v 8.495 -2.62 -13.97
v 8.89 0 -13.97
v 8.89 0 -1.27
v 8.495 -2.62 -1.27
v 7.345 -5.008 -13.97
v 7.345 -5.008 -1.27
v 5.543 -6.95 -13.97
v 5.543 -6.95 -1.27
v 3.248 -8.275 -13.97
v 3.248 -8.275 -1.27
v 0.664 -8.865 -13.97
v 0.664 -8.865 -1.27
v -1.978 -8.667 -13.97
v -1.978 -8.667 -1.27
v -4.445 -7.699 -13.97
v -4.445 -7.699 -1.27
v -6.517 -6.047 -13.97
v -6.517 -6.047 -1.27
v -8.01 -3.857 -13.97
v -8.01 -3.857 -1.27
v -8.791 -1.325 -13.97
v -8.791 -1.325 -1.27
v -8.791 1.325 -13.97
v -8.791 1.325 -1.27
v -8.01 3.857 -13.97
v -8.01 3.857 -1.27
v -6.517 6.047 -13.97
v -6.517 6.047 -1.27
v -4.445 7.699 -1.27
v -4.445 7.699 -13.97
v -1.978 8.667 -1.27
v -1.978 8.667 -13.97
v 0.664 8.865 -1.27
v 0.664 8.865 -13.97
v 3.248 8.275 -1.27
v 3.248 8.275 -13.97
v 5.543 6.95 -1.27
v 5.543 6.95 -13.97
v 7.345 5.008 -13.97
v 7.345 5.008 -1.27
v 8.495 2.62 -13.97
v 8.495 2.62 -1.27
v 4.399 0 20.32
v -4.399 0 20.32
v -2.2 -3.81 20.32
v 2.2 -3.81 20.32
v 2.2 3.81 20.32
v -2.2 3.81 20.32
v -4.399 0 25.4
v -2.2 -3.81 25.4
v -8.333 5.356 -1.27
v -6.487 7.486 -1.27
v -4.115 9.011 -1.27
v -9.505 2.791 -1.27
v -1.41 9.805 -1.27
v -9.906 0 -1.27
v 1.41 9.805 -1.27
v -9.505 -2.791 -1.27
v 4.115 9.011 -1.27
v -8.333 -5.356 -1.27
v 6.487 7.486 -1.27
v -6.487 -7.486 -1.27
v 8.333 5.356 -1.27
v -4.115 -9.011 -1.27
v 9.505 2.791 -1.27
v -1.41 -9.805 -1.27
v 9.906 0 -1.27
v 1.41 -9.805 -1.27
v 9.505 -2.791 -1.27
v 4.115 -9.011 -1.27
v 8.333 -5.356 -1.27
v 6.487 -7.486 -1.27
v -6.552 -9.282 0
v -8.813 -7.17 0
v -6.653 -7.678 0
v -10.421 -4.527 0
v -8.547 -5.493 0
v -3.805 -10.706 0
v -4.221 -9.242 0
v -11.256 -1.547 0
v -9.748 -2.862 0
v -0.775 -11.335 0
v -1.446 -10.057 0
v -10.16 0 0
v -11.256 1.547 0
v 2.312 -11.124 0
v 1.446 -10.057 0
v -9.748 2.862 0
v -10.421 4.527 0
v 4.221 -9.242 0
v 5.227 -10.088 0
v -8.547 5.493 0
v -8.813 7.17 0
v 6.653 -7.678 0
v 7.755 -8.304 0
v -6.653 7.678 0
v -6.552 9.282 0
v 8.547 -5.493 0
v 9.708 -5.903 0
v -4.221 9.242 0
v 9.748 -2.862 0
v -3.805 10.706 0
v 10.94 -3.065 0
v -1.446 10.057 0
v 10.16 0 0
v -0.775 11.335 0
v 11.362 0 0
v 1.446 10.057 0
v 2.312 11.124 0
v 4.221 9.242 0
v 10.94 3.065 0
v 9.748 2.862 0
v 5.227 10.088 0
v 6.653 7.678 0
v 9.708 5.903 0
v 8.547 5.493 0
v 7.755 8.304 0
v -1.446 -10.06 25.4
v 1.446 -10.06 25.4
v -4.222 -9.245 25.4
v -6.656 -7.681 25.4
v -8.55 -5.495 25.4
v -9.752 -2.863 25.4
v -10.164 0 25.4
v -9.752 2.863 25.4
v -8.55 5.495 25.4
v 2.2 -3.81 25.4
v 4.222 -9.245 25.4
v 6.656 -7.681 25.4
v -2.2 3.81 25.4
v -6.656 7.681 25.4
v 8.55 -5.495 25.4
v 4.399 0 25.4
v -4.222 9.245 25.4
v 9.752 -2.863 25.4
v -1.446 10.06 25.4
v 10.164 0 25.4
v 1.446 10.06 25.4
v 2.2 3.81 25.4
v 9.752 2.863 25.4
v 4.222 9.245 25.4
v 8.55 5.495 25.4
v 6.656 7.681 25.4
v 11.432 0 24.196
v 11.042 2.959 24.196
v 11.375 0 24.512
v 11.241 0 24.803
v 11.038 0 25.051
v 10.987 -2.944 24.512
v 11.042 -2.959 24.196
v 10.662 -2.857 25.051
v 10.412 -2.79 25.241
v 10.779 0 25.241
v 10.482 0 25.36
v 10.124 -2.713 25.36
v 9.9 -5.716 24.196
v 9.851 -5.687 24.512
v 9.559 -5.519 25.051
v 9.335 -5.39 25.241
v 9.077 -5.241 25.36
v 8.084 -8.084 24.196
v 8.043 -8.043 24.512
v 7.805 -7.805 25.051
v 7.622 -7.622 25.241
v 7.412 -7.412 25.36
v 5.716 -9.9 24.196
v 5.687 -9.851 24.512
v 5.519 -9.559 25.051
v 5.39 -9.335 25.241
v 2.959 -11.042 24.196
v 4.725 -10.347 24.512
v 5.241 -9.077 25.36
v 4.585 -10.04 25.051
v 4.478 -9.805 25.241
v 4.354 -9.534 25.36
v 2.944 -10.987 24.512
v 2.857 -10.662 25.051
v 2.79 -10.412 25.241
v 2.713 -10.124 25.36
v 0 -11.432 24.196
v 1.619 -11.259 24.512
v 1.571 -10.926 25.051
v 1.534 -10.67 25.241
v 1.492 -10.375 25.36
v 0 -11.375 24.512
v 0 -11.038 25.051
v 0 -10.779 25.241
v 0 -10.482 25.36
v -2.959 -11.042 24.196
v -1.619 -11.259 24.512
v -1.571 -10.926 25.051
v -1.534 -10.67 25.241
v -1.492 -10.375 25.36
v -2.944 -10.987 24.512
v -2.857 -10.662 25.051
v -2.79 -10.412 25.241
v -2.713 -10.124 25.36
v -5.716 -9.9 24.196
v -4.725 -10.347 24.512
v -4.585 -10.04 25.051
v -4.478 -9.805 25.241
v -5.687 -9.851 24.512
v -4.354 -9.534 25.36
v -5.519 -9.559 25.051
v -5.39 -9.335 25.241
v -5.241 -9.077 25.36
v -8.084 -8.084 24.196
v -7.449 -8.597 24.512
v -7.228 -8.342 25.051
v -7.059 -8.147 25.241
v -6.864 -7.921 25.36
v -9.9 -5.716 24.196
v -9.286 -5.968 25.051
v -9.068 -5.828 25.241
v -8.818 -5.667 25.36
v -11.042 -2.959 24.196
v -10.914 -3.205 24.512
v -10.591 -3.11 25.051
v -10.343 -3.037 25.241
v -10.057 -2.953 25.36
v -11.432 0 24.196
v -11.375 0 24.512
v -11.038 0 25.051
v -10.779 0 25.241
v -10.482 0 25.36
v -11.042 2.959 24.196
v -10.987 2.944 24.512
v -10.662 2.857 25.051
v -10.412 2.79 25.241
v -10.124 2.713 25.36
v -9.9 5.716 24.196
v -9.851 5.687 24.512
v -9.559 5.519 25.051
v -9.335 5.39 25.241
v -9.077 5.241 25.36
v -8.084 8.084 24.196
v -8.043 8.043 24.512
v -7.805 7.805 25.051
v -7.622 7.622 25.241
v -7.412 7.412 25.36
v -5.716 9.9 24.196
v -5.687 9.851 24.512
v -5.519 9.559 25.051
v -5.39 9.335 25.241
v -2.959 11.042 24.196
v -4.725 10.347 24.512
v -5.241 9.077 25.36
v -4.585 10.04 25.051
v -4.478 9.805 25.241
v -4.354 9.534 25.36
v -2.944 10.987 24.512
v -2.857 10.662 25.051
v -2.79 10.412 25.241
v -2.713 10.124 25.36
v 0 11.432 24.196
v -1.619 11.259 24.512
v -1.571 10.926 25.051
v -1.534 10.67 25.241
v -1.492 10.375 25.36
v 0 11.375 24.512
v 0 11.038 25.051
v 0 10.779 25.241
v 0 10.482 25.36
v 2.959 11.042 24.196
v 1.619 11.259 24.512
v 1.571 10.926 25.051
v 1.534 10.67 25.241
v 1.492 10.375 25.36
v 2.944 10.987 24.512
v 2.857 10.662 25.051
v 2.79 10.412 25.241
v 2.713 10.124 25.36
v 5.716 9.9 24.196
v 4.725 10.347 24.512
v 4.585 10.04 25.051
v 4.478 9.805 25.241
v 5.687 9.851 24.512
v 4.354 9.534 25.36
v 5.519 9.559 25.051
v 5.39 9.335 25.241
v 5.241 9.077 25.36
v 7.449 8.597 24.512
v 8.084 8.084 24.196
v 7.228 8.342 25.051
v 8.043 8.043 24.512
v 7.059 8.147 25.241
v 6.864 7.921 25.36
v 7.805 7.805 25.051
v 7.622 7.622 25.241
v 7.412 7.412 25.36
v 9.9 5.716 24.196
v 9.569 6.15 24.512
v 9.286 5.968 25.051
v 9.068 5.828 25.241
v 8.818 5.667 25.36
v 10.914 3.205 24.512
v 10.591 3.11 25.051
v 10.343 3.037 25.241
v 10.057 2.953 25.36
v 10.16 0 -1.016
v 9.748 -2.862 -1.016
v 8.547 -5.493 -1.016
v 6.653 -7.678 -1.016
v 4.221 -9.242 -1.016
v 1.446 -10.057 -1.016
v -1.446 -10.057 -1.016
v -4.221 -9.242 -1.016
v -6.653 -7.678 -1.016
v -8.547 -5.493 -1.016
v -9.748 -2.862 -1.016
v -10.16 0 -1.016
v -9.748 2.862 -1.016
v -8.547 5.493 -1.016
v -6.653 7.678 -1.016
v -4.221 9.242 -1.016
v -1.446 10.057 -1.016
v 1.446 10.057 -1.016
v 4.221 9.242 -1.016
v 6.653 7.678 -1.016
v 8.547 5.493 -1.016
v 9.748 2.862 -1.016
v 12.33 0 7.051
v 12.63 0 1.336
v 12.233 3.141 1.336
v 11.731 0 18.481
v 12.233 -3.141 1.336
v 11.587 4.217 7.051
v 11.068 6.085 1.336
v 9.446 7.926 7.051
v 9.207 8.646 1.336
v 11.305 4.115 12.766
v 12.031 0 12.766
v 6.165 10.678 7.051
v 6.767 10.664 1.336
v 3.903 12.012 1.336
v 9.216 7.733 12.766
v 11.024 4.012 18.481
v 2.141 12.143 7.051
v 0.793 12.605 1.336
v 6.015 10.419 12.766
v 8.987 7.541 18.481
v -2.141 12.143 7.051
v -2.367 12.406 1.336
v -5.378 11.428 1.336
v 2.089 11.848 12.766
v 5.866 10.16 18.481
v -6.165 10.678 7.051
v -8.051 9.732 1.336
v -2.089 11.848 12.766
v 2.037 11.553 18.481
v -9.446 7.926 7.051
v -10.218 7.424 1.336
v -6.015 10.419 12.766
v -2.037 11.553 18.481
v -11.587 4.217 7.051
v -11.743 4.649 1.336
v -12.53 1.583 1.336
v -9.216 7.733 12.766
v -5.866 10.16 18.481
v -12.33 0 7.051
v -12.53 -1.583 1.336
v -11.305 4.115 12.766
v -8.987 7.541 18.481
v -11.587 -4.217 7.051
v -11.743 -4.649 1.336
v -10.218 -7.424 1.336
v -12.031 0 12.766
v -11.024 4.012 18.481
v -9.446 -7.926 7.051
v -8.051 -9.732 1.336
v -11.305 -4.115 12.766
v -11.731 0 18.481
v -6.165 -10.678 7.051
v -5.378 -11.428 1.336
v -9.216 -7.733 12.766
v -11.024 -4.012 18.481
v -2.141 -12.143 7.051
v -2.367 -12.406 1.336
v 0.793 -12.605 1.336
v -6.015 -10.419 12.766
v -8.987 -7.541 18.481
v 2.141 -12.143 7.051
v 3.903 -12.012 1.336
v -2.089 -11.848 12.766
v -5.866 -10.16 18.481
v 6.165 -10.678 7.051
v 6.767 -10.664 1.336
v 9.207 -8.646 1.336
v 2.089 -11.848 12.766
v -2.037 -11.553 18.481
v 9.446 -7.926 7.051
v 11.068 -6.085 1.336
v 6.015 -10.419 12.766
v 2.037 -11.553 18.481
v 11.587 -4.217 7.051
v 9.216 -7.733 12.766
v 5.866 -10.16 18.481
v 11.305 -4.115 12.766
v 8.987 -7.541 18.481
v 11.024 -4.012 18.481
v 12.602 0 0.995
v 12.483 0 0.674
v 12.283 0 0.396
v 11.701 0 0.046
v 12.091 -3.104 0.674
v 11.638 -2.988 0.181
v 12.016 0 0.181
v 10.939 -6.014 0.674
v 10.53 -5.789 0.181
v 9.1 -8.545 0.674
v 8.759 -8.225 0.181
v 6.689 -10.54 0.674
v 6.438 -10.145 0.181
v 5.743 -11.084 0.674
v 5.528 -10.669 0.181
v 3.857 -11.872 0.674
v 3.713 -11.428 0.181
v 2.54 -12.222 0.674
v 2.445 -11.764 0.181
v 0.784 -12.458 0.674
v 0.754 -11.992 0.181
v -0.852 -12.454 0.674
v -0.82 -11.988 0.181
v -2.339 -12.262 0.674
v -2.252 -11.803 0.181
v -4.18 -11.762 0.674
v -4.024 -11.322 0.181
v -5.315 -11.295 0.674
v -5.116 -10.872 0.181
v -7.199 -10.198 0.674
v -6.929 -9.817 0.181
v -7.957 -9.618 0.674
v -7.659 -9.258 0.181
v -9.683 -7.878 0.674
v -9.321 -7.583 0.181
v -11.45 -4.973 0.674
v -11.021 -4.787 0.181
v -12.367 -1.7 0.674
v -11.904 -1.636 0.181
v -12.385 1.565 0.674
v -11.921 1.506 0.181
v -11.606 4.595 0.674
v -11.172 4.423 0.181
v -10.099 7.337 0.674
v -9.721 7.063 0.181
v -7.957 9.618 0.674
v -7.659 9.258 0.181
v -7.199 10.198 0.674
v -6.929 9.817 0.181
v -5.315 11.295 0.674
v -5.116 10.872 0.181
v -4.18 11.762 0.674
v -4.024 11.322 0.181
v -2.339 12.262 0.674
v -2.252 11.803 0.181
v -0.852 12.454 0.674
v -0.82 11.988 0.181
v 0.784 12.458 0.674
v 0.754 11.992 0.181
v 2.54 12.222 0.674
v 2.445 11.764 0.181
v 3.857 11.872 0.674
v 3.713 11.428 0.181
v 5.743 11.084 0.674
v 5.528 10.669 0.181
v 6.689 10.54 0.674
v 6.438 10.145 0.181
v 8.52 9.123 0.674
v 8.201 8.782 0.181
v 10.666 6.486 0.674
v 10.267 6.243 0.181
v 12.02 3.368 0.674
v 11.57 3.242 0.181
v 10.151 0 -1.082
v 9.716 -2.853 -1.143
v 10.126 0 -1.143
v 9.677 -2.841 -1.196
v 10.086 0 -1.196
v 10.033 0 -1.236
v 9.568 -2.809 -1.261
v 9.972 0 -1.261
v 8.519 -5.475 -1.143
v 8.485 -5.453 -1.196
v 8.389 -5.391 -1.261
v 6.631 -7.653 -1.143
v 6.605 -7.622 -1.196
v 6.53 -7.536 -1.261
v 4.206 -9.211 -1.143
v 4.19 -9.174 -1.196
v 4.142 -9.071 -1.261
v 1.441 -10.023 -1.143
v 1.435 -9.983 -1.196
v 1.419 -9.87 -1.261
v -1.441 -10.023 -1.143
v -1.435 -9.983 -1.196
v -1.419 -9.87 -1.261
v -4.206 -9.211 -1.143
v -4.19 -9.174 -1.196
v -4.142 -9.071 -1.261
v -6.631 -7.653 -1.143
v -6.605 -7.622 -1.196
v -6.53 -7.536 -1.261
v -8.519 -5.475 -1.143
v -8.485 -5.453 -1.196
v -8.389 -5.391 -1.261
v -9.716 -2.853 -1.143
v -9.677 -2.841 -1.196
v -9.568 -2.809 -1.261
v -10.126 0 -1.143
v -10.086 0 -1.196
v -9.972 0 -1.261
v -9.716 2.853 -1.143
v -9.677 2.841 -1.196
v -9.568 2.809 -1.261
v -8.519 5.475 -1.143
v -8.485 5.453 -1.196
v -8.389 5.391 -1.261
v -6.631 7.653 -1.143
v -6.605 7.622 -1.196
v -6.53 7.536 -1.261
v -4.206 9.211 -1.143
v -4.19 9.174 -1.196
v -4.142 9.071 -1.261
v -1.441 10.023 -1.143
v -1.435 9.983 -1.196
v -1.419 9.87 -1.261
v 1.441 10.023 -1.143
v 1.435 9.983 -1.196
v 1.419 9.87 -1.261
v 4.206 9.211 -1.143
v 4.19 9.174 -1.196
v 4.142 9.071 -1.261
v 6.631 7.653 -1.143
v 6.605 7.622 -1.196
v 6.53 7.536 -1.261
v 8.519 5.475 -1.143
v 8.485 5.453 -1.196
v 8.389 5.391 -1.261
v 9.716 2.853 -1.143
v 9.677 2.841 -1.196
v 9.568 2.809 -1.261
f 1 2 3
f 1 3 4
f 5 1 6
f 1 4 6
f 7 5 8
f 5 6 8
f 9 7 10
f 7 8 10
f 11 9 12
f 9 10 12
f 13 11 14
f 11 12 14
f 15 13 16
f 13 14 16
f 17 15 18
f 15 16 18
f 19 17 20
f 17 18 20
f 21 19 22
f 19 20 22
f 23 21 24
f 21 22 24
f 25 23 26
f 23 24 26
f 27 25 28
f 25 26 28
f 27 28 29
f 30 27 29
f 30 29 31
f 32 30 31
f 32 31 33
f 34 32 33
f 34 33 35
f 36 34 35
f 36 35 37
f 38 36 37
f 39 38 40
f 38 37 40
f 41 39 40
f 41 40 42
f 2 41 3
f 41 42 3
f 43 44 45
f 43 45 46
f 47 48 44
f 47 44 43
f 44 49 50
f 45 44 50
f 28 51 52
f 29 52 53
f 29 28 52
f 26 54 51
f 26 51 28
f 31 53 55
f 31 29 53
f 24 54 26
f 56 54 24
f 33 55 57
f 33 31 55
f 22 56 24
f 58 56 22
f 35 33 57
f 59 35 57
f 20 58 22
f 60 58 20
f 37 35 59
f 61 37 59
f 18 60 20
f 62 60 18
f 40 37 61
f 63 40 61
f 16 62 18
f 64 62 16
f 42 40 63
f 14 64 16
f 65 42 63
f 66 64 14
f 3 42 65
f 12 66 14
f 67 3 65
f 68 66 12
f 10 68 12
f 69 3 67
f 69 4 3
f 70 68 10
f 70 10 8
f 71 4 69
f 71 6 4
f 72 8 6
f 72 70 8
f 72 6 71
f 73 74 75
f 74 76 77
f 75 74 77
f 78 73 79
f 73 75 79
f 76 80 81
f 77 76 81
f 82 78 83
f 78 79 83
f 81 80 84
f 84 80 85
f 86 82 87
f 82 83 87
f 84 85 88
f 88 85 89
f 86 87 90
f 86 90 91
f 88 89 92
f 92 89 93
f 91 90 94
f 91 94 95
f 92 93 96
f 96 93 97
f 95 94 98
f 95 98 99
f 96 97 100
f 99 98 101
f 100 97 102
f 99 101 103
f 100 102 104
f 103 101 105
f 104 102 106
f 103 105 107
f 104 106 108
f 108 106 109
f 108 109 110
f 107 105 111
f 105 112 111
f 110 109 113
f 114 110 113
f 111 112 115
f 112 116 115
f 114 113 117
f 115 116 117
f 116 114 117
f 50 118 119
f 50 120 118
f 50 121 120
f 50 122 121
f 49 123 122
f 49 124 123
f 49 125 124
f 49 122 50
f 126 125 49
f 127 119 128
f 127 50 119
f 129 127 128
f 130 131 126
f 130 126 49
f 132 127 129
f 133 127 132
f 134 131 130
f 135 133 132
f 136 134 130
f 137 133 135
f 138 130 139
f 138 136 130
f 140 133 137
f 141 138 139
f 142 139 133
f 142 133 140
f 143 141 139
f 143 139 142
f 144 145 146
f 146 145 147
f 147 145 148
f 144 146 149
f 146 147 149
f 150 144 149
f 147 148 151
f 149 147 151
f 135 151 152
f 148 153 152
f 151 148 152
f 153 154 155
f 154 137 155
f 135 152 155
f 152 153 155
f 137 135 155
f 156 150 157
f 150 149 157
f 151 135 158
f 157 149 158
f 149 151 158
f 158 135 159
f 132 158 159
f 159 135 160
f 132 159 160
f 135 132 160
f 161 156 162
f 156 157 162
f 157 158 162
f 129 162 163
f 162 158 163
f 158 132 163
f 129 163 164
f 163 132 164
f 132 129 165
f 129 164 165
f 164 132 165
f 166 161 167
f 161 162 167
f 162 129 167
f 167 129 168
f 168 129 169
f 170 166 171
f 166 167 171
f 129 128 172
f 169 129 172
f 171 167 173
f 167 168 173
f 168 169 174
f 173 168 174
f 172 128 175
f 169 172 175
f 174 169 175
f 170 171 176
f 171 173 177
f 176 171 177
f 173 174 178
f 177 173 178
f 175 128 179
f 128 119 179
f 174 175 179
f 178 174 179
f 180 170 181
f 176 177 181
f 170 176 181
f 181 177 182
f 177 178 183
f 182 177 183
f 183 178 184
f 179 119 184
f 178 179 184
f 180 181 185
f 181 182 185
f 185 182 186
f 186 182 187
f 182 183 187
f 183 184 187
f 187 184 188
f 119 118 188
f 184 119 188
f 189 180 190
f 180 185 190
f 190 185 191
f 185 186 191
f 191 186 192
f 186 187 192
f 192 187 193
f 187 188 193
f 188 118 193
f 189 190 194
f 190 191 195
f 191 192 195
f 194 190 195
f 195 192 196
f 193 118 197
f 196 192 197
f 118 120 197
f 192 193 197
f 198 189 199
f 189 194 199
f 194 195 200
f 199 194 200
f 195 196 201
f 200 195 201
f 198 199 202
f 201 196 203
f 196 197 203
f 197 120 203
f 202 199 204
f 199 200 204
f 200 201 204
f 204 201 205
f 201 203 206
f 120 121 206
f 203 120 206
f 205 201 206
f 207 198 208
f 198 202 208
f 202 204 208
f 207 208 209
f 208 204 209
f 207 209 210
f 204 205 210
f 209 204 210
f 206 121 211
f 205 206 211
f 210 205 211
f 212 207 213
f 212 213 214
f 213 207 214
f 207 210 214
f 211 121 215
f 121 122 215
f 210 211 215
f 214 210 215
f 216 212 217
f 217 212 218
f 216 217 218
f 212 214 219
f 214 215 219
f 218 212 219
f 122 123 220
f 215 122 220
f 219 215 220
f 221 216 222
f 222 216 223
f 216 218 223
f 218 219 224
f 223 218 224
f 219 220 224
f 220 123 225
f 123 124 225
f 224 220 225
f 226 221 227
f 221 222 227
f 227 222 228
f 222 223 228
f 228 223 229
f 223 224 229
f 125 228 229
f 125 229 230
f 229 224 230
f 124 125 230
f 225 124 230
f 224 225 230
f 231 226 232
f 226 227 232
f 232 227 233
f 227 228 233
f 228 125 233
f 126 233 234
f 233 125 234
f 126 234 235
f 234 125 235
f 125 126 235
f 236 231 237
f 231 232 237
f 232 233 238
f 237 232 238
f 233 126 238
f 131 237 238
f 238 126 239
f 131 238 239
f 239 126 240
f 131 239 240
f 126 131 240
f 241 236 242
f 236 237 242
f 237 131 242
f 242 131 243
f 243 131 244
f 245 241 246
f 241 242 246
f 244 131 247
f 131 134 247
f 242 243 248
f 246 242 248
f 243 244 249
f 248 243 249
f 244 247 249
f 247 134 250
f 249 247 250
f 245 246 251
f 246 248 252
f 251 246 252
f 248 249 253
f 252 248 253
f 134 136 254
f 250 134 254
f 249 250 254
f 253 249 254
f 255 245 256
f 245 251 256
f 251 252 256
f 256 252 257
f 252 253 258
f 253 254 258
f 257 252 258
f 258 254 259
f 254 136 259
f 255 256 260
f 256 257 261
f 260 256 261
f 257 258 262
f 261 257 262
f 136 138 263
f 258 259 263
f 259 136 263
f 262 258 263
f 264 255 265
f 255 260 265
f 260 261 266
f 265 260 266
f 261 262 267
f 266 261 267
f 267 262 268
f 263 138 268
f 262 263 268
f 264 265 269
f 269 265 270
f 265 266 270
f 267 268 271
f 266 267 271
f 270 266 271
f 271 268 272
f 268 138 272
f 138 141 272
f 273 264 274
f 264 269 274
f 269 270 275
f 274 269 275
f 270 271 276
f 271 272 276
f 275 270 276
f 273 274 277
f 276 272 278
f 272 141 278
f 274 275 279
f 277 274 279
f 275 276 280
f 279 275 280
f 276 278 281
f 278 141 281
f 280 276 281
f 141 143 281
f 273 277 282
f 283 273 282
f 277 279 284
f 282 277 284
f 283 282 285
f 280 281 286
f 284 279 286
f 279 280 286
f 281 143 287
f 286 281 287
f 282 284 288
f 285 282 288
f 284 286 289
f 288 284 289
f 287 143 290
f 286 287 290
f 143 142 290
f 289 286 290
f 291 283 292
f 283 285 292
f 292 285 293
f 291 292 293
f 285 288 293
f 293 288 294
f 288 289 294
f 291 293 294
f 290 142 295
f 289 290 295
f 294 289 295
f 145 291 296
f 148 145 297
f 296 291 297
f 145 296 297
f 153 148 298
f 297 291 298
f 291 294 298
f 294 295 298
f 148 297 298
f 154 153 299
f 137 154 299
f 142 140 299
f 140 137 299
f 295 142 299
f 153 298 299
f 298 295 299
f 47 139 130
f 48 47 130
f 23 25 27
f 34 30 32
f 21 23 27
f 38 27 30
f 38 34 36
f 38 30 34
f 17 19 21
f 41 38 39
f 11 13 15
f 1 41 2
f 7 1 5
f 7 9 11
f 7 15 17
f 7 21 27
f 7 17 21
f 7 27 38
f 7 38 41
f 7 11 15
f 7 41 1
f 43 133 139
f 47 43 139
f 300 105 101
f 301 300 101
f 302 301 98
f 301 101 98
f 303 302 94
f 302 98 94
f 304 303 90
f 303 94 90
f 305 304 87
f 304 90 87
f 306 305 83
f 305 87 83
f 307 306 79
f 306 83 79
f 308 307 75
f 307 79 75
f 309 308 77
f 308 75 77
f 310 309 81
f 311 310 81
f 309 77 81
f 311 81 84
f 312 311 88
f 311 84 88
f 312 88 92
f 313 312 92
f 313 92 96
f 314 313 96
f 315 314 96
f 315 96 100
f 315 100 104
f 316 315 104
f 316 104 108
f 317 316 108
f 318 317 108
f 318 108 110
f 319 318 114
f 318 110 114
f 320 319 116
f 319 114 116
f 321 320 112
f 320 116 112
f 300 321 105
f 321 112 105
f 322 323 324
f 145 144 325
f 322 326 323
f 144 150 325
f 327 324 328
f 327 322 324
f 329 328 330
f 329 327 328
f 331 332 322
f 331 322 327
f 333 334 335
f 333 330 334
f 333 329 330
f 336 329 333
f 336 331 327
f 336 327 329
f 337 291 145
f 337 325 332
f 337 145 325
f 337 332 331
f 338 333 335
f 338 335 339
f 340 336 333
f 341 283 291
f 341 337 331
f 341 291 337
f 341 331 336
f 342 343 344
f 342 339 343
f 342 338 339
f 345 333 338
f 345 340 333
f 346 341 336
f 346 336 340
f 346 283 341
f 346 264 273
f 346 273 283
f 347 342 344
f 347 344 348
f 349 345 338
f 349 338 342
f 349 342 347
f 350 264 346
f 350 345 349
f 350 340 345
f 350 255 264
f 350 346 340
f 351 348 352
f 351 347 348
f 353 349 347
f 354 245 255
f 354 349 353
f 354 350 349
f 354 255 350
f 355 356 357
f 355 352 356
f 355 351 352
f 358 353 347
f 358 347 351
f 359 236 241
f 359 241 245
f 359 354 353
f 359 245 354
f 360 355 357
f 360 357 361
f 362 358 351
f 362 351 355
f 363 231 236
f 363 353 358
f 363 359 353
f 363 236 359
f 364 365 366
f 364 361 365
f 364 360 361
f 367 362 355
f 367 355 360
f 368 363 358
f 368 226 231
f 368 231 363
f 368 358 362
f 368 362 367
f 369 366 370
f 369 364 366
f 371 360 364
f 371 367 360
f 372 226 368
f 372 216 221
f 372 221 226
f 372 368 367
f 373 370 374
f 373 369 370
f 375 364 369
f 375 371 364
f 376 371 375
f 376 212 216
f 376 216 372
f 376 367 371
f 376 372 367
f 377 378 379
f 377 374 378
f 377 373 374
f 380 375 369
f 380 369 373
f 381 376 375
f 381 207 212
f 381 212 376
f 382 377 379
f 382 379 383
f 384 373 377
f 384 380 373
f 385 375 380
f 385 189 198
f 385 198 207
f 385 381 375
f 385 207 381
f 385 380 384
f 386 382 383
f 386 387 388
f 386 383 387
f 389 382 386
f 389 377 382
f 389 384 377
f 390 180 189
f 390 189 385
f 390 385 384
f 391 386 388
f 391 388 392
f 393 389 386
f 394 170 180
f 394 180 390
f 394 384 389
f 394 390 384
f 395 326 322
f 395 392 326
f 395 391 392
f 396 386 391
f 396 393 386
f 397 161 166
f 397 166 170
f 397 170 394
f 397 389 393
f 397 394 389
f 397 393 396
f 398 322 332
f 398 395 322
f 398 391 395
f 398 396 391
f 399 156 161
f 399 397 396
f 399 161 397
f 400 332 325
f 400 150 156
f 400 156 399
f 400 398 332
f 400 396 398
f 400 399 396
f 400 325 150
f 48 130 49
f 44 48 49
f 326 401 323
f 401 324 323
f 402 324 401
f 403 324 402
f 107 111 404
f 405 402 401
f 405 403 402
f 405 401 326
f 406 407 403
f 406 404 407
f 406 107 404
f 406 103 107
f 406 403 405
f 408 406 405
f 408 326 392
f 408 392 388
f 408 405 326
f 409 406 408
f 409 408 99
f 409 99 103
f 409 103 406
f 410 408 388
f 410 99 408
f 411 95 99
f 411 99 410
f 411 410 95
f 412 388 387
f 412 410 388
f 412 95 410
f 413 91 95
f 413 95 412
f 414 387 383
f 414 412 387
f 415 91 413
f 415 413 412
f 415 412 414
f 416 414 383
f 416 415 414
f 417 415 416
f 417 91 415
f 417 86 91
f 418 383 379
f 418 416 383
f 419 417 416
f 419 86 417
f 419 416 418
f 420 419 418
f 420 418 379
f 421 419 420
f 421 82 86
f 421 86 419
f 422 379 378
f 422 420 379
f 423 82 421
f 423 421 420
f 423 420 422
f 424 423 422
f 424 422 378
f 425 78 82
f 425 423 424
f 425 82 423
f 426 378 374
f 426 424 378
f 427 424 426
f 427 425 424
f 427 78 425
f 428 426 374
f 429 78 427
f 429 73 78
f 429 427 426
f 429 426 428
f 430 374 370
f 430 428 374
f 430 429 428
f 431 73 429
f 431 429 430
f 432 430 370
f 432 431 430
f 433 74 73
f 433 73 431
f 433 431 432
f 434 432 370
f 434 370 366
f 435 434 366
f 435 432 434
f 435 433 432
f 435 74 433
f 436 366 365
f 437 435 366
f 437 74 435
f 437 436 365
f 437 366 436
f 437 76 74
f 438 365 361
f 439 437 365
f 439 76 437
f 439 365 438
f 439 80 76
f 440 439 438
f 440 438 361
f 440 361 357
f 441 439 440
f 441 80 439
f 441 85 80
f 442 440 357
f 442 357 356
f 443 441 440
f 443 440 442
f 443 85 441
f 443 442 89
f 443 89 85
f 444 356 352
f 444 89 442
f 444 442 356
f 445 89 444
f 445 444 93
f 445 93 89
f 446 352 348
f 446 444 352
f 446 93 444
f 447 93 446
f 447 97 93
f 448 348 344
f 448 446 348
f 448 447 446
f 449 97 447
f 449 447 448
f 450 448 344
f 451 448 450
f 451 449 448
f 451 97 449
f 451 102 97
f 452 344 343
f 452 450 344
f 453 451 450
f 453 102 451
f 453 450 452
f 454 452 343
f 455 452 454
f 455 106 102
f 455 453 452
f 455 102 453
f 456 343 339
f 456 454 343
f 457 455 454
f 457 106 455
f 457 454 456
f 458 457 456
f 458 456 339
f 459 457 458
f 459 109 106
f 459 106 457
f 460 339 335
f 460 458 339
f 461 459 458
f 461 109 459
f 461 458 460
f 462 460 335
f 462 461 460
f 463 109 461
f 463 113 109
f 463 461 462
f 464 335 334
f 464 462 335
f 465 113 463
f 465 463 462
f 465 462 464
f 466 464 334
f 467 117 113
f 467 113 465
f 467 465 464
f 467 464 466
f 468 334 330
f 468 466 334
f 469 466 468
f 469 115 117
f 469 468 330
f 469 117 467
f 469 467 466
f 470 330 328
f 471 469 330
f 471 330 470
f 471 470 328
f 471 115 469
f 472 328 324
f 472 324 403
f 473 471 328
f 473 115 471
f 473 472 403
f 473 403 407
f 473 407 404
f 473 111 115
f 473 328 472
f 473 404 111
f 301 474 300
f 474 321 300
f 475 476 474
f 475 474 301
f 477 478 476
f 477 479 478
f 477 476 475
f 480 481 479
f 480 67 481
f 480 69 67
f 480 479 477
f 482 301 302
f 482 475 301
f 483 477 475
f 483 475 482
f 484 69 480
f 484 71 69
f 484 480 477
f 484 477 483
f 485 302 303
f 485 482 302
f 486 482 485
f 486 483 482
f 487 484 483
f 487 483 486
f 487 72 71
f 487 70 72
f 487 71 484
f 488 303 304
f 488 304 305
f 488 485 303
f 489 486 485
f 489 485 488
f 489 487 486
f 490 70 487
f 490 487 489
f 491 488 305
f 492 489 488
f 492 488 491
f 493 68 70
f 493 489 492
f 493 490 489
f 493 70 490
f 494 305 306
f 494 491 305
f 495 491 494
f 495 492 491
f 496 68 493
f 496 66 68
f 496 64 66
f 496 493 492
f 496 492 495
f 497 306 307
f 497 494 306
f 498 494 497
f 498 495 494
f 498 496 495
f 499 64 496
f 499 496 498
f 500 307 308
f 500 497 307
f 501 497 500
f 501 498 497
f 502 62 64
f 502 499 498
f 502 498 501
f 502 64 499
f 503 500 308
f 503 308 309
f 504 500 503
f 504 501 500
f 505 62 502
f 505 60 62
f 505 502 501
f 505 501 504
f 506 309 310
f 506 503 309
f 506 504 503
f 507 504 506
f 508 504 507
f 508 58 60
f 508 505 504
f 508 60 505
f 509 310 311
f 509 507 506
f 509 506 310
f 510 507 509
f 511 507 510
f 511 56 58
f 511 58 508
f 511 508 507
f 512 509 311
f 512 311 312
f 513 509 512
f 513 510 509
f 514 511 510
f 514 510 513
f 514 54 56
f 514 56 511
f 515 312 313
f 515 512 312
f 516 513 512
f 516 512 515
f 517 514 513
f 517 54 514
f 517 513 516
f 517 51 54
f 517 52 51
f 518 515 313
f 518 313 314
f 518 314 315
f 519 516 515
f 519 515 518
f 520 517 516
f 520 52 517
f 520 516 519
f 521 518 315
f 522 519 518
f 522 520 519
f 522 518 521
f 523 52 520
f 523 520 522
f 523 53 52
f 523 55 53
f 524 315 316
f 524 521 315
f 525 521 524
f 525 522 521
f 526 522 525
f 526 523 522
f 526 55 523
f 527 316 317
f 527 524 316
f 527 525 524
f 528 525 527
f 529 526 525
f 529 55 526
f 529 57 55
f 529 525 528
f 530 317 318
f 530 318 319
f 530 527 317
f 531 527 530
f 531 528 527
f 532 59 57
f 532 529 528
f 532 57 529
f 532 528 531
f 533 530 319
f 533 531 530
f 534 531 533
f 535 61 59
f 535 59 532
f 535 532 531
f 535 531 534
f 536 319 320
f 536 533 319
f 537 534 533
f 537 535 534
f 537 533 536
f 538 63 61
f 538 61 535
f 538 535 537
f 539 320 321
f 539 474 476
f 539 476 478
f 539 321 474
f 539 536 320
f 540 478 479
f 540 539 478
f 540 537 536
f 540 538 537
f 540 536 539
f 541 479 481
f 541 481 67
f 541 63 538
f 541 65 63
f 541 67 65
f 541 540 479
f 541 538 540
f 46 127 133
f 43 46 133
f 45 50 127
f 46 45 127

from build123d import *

# Parameters (mm, degrees)
F0_R      = 12.7
F1_DEPTH  = 25.4
F1_TAPER  = 3
F3_DEPTH  = 5.08
F4_R      = 1.27
F5_R      = 1.27
F7_R      = 10.16
F8_DEPTH  = 1.27
F9_R      = 0.254
F10_R     = 8.89
F11_DEPTH = 12.7


with BuildPart() as f1:
    # F0 (on Top) → F1 (new body)
    with BuildSketch(Plane.XY):
        Circle(F0_R)
    extrude(amount=F1_DEPTH, taper=F1_TAPER)

    # F2 (on face) → F3 (cut)
    with BuildSketch(Plane.XY.offset(25.4)):
        Polygon((2.1997045256, 3.81), (-2.1997045256, 3.81), (-4.3994090512, 0), (-2.1997045256, -3.81), (2.1997045256, -3.81), (4.3994090512, 0), align=None)
    extrude(amount=-F3_DEPTH, mode=Mode.SUBTRACT)

    # F4
    f4_edges = [f1.edges().sort_by_distance(p)[0] for p in [
        (-11.368842, 0, 25.4),
    ]]
    fillet(f4_edges, radius=F4_R)

    # F5
    f5_edges = [f1.edges().sort_by_distance(p)[0] for p in [
        (-12.7, 0, 0),
    ]]
    fillet(f5_edges, radius=F5_R)

    # F7 (on face) → F8 (join)
    with BuildSketch(Plane(origin=(0, 0, 0), x_dir=(1, 0, 0), z_dir=(0, 0, -1))):
        Circle(F7_R)
    extrude(amount=F8_DEPTH)

    # F9
    f9_edges = [f1.edges().sort_by_distance(p)[0] for p in [
        (-10.16, 0, -1.27),
    ]]
    fillet(f9_edges, radius=F9_R)

    # F10 (on face) → F11 (join)
    with BuildSketch(Plane(origin=(0, 0, -1.27), x_dir=(1, 0, 0), z_dir=(0, 0, -1))):
        Circle(F10_R)
    extrude(amount=F11_DEPTH)


solid = f1.part
